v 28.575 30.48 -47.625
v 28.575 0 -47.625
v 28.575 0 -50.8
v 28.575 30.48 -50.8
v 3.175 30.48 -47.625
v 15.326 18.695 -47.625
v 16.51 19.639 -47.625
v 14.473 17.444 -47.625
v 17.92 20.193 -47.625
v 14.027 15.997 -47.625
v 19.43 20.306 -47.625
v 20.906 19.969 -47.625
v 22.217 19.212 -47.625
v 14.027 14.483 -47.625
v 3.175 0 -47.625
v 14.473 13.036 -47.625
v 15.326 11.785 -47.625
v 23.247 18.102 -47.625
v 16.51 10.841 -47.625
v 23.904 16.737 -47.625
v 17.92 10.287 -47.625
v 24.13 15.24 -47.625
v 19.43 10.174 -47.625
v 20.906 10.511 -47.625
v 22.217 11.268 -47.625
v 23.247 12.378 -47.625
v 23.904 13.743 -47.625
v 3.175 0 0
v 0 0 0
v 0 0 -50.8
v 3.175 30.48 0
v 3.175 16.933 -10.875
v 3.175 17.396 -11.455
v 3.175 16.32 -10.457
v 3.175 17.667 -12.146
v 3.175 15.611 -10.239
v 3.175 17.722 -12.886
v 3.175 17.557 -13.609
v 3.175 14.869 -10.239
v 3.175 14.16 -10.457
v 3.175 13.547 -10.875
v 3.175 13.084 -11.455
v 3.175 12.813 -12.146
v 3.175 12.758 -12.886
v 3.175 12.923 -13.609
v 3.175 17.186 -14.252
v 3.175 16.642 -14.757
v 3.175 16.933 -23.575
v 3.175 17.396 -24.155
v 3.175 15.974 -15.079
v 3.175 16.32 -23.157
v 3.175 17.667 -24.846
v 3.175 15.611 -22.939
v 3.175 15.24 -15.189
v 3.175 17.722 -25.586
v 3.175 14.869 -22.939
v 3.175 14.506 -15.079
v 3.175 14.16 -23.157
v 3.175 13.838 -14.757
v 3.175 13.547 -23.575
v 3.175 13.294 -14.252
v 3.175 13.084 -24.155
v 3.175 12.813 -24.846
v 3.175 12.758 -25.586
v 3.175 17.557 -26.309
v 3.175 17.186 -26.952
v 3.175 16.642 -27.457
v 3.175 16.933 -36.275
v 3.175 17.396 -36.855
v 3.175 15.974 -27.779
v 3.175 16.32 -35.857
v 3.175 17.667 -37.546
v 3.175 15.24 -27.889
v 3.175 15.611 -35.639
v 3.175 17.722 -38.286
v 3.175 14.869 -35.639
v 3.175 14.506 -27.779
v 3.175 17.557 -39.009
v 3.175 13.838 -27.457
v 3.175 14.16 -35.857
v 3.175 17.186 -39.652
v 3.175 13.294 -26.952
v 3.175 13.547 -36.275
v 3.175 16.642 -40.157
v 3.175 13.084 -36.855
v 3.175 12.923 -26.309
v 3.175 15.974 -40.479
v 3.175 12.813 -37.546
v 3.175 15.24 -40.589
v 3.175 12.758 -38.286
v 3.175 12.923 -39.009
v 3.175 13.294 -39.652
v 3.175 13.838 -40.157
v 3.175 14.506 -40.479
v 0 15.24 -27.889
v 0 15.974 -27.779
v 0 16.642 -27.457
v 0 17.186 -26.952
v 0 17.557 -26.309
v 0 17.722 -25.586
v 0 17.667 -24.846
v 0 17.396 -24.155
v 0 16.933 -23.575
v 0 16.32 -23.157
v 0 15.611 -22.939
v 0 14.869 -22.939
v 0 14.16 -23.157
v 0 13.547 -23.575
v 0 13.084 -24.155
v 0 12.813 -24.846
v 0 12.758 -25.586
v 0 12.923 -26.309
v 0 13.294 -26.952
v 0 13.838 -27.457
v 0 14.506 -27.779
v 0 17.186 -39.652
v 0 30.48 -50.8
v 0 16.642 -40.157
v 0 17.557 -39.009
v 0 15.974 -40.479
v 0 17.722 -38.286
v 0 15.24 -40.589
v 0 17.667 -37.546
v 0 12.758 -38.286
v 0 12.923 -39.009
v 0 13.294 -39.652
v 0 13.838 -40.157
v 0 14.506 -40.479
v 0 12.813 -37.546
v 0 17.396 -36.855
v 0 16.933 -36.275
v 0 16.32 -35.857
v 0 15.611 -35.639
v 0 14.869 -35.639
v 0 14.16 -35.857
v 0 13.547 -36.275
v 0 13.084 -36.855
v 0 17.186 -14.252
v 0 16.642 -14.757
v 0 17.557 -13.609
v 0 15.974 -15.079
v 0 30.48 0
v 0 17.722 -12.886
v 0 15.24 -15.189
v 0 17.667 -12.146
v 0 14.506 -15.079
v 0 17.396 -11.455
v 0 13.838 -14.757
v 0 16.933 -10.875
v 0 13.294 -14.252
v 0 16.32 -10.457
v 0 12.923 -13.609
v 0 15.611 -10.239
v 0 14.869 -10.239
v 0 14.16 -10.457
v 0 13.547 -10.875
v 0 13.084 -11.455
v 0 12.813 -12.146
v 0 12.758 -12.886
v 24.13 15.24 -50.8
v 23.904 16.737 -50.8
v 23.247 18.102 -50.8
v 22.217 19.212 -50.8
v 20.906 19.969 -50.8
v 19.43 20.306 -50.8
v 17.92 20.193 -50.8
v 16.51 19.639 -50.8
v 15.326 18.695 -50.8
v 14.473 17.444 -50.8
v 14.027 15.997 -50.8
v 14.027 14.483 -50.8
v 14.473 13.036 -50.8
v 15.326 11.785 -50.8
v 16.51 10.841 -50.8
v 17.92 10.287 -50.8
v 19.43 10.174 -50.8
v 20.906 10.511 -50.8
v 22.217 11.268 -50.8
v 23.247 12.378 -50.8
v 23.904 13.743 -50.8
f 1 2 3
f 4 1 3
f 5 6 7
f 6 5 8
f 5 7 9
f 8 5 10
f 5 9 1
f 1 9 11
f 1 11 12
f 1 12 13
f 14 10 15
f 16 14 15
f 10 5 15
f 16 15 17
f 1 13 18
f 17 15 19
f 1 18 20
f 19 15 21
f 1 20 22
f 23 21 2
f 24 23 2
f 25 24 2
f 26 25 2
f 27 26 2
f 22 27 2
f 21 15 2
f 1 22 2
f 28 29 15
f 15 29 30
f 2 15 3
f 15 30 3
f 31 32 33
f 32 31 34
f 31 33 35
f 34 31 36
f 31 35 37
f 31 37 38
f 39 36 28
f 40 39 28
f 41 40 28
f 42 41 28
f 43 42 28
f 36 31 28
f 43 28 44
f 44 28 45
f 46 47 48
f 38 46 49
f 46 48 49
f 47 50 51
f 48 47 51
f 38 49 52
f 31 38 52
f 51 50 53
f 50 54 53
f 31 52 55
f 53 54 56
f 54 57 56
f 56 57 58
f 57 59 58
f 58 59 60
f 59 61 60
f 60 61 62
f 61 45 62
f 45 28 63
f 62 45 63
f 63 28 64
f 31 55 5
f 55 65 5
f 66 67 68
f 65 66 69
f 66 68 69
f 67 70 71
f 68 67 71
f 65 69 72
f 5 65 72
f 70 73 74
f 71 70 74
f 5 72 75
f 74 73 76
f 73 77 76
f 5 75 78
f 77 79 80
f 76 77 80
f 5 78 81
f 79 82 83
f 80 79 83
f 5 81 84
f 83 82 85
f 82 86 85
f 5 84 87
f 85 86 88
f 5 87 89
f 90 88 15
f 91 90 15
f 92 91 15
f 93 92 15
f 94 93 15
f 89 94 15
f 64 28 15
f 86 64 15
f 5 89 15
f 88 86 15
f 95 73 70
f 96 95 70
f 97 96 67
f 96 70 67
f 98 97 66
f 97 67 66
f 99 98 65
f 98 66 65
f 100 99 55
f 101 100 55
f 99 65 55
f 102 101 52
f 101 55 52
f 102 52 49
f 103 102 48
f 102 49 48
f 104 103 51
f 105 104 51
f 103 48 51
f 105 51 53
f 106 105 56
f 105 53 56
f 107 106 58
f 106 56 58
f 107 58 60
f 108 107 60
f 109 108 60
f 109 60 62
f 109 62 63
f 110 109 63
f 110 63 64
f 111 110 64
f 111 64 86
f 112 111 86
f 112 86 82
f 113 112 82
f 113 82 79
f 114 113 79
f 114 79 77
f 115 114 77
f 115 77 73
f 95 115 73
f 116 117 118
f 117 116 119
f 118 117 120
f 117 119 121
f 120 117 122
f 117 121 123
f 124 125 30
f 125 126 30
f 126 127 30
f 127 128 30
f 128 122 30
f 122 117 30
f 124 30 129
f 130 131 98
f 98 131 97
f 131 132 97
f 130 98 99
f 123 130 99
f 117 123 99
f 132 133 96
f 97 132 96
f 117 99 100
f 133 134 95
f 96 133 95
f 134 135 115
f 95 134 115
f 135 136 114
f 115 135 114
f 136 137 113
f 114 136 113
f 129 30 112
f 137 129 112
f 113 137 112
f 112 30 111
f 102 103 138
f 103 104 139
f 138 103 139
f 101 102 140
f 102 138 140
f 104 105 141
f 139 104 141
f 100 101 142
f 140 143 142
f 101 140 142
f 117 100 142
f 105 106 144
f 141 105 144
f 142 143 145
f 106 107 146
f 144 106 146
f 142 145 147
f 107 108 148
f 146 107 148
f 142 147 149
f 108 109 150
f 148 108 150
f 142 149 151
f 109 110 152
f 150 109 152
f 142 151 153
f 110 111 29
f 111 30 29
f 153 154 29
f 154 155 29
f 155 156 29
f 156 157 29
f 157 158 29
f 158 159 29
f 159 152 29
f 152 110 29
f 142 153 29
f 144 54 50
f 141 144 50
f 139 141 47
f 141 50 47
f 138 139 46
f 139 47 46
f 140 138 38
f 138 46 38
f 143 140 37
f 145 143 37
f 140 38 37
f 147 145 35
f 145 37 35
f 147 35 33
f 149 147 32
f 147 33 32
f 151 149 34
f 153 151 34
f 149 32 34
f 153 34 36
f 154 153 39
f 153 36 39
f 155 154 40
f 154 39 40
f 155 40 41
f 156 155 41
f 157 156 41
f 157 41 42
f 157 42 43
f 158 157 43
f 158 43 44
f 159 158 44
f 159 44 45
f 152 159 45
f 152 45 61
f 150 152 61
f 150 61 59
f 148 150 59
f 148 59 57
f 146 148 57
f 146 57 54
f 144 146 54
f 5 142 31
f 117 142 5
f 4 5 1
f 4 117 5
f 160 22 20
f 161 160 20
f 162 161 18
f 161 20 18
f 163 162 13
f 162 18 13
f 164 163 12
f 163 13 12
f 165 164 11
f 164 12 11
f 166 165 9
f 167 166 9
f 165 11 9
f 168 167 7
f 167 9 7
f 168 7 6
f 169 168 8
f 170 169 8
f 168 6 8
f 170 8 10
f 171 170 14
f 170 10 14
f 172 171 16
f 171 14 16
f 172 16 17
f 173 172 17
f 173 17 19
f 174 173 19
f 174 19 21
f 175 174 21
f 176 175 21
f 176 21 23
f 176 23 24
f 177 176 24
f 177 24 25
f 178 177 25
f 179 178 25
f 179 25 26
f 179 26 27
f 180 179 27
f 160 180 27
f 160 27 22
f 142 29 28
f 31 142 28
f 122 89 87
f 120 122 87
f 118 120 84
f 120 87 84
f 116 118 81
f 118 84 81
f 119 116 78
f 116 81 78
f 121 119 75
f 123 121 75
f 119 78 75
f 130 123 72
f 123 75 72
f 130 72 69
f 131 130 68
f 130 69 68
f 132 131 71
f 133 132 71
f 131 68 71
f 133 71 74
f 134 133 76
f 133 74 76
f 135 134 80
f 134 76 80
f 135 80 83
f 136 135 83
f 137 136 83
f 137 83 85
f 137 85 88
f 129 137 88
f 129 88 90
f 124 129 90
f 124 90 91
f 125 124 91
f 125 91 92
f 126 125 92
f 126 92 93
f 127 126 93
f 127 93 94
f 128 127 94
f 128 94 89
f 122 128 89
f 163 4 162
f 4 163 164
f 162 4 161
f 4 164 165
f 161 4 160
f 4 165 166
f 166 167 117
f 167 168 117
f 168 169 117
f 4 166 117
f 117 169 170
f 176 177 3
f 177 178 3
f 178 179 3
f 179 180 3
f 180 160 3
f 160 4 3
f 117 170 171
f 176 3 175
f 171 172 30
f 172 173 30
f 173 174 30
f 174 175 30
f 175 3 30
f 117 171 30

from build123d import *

# Parameters (mm, degrees)
SKETCH1_W           = 3.175
SKETCH1_H           = 47.625
SKETCH1_W_2         = 25.4
SKETCH1_H_2         = 3.175
BOSS_EXTRUDE1_DEPTH = 30.48
SKETCH2_R           = 5.08
CUT_EXTRUDE1_DEPTH  = 32.766
SKETCH3_R           = 2.4892
CUT_EXTRUDE2_DEPTH  = 32.766


with BuildPart() as part:
    # Sketch1 → Boss-Extrude1 (new body)
    with BuildSketch(Plane(origin=(0, 0, 0), x_dir=(1, 0, 0), z_dir=(0, 1, 0))):
        with Locations((1.5875, 23.8125)):
            Rectangle(SKETCH1_W, SKETCH1_H)
        with Locations((15.875, 49.2125)):
            Rectangle(SKETCH1_W_2, SKETCH1_H_2)
        with Locations((1.5875, 49.2125)):
            Rectangle(SKETCH1_W, SKETCH1_H_2)
    extrude(amount=BOSS_EXTRUDE1_DEPTH)

    # Sketch2 → Cut-Extrude1 (cut)
    with BuildSketch(Plane.XY.offset(-47.625)):
        with Locations((19.05, 15.24)):
            Circle(SKETCH2_R)
    extrude(amount=-CUT_EXTRUDE1_DEPTH, mode=Mode.SUBTRACT)

    # Sketch3 → Cut-Extrude2 (cut)
    with BuildSketch(Plane(origin=(3.175, 0, 0), x_dir=(0, 0, -1), z_dir=(1, 0, 0))):
        with Locations((12.7, 15.24)):
            Circle(SKETCH3_R)
        with Locations((25.4, 15.24)):
            Circle(SKETCH3_R)
        with Locations((38.1, 15.24)):
            Circle(SKETCH3_R)
    extrude(amount=-CUT_EXTRUDE2_DEPTH, mode=Mode.SUBTRACT)


solid = part.part
